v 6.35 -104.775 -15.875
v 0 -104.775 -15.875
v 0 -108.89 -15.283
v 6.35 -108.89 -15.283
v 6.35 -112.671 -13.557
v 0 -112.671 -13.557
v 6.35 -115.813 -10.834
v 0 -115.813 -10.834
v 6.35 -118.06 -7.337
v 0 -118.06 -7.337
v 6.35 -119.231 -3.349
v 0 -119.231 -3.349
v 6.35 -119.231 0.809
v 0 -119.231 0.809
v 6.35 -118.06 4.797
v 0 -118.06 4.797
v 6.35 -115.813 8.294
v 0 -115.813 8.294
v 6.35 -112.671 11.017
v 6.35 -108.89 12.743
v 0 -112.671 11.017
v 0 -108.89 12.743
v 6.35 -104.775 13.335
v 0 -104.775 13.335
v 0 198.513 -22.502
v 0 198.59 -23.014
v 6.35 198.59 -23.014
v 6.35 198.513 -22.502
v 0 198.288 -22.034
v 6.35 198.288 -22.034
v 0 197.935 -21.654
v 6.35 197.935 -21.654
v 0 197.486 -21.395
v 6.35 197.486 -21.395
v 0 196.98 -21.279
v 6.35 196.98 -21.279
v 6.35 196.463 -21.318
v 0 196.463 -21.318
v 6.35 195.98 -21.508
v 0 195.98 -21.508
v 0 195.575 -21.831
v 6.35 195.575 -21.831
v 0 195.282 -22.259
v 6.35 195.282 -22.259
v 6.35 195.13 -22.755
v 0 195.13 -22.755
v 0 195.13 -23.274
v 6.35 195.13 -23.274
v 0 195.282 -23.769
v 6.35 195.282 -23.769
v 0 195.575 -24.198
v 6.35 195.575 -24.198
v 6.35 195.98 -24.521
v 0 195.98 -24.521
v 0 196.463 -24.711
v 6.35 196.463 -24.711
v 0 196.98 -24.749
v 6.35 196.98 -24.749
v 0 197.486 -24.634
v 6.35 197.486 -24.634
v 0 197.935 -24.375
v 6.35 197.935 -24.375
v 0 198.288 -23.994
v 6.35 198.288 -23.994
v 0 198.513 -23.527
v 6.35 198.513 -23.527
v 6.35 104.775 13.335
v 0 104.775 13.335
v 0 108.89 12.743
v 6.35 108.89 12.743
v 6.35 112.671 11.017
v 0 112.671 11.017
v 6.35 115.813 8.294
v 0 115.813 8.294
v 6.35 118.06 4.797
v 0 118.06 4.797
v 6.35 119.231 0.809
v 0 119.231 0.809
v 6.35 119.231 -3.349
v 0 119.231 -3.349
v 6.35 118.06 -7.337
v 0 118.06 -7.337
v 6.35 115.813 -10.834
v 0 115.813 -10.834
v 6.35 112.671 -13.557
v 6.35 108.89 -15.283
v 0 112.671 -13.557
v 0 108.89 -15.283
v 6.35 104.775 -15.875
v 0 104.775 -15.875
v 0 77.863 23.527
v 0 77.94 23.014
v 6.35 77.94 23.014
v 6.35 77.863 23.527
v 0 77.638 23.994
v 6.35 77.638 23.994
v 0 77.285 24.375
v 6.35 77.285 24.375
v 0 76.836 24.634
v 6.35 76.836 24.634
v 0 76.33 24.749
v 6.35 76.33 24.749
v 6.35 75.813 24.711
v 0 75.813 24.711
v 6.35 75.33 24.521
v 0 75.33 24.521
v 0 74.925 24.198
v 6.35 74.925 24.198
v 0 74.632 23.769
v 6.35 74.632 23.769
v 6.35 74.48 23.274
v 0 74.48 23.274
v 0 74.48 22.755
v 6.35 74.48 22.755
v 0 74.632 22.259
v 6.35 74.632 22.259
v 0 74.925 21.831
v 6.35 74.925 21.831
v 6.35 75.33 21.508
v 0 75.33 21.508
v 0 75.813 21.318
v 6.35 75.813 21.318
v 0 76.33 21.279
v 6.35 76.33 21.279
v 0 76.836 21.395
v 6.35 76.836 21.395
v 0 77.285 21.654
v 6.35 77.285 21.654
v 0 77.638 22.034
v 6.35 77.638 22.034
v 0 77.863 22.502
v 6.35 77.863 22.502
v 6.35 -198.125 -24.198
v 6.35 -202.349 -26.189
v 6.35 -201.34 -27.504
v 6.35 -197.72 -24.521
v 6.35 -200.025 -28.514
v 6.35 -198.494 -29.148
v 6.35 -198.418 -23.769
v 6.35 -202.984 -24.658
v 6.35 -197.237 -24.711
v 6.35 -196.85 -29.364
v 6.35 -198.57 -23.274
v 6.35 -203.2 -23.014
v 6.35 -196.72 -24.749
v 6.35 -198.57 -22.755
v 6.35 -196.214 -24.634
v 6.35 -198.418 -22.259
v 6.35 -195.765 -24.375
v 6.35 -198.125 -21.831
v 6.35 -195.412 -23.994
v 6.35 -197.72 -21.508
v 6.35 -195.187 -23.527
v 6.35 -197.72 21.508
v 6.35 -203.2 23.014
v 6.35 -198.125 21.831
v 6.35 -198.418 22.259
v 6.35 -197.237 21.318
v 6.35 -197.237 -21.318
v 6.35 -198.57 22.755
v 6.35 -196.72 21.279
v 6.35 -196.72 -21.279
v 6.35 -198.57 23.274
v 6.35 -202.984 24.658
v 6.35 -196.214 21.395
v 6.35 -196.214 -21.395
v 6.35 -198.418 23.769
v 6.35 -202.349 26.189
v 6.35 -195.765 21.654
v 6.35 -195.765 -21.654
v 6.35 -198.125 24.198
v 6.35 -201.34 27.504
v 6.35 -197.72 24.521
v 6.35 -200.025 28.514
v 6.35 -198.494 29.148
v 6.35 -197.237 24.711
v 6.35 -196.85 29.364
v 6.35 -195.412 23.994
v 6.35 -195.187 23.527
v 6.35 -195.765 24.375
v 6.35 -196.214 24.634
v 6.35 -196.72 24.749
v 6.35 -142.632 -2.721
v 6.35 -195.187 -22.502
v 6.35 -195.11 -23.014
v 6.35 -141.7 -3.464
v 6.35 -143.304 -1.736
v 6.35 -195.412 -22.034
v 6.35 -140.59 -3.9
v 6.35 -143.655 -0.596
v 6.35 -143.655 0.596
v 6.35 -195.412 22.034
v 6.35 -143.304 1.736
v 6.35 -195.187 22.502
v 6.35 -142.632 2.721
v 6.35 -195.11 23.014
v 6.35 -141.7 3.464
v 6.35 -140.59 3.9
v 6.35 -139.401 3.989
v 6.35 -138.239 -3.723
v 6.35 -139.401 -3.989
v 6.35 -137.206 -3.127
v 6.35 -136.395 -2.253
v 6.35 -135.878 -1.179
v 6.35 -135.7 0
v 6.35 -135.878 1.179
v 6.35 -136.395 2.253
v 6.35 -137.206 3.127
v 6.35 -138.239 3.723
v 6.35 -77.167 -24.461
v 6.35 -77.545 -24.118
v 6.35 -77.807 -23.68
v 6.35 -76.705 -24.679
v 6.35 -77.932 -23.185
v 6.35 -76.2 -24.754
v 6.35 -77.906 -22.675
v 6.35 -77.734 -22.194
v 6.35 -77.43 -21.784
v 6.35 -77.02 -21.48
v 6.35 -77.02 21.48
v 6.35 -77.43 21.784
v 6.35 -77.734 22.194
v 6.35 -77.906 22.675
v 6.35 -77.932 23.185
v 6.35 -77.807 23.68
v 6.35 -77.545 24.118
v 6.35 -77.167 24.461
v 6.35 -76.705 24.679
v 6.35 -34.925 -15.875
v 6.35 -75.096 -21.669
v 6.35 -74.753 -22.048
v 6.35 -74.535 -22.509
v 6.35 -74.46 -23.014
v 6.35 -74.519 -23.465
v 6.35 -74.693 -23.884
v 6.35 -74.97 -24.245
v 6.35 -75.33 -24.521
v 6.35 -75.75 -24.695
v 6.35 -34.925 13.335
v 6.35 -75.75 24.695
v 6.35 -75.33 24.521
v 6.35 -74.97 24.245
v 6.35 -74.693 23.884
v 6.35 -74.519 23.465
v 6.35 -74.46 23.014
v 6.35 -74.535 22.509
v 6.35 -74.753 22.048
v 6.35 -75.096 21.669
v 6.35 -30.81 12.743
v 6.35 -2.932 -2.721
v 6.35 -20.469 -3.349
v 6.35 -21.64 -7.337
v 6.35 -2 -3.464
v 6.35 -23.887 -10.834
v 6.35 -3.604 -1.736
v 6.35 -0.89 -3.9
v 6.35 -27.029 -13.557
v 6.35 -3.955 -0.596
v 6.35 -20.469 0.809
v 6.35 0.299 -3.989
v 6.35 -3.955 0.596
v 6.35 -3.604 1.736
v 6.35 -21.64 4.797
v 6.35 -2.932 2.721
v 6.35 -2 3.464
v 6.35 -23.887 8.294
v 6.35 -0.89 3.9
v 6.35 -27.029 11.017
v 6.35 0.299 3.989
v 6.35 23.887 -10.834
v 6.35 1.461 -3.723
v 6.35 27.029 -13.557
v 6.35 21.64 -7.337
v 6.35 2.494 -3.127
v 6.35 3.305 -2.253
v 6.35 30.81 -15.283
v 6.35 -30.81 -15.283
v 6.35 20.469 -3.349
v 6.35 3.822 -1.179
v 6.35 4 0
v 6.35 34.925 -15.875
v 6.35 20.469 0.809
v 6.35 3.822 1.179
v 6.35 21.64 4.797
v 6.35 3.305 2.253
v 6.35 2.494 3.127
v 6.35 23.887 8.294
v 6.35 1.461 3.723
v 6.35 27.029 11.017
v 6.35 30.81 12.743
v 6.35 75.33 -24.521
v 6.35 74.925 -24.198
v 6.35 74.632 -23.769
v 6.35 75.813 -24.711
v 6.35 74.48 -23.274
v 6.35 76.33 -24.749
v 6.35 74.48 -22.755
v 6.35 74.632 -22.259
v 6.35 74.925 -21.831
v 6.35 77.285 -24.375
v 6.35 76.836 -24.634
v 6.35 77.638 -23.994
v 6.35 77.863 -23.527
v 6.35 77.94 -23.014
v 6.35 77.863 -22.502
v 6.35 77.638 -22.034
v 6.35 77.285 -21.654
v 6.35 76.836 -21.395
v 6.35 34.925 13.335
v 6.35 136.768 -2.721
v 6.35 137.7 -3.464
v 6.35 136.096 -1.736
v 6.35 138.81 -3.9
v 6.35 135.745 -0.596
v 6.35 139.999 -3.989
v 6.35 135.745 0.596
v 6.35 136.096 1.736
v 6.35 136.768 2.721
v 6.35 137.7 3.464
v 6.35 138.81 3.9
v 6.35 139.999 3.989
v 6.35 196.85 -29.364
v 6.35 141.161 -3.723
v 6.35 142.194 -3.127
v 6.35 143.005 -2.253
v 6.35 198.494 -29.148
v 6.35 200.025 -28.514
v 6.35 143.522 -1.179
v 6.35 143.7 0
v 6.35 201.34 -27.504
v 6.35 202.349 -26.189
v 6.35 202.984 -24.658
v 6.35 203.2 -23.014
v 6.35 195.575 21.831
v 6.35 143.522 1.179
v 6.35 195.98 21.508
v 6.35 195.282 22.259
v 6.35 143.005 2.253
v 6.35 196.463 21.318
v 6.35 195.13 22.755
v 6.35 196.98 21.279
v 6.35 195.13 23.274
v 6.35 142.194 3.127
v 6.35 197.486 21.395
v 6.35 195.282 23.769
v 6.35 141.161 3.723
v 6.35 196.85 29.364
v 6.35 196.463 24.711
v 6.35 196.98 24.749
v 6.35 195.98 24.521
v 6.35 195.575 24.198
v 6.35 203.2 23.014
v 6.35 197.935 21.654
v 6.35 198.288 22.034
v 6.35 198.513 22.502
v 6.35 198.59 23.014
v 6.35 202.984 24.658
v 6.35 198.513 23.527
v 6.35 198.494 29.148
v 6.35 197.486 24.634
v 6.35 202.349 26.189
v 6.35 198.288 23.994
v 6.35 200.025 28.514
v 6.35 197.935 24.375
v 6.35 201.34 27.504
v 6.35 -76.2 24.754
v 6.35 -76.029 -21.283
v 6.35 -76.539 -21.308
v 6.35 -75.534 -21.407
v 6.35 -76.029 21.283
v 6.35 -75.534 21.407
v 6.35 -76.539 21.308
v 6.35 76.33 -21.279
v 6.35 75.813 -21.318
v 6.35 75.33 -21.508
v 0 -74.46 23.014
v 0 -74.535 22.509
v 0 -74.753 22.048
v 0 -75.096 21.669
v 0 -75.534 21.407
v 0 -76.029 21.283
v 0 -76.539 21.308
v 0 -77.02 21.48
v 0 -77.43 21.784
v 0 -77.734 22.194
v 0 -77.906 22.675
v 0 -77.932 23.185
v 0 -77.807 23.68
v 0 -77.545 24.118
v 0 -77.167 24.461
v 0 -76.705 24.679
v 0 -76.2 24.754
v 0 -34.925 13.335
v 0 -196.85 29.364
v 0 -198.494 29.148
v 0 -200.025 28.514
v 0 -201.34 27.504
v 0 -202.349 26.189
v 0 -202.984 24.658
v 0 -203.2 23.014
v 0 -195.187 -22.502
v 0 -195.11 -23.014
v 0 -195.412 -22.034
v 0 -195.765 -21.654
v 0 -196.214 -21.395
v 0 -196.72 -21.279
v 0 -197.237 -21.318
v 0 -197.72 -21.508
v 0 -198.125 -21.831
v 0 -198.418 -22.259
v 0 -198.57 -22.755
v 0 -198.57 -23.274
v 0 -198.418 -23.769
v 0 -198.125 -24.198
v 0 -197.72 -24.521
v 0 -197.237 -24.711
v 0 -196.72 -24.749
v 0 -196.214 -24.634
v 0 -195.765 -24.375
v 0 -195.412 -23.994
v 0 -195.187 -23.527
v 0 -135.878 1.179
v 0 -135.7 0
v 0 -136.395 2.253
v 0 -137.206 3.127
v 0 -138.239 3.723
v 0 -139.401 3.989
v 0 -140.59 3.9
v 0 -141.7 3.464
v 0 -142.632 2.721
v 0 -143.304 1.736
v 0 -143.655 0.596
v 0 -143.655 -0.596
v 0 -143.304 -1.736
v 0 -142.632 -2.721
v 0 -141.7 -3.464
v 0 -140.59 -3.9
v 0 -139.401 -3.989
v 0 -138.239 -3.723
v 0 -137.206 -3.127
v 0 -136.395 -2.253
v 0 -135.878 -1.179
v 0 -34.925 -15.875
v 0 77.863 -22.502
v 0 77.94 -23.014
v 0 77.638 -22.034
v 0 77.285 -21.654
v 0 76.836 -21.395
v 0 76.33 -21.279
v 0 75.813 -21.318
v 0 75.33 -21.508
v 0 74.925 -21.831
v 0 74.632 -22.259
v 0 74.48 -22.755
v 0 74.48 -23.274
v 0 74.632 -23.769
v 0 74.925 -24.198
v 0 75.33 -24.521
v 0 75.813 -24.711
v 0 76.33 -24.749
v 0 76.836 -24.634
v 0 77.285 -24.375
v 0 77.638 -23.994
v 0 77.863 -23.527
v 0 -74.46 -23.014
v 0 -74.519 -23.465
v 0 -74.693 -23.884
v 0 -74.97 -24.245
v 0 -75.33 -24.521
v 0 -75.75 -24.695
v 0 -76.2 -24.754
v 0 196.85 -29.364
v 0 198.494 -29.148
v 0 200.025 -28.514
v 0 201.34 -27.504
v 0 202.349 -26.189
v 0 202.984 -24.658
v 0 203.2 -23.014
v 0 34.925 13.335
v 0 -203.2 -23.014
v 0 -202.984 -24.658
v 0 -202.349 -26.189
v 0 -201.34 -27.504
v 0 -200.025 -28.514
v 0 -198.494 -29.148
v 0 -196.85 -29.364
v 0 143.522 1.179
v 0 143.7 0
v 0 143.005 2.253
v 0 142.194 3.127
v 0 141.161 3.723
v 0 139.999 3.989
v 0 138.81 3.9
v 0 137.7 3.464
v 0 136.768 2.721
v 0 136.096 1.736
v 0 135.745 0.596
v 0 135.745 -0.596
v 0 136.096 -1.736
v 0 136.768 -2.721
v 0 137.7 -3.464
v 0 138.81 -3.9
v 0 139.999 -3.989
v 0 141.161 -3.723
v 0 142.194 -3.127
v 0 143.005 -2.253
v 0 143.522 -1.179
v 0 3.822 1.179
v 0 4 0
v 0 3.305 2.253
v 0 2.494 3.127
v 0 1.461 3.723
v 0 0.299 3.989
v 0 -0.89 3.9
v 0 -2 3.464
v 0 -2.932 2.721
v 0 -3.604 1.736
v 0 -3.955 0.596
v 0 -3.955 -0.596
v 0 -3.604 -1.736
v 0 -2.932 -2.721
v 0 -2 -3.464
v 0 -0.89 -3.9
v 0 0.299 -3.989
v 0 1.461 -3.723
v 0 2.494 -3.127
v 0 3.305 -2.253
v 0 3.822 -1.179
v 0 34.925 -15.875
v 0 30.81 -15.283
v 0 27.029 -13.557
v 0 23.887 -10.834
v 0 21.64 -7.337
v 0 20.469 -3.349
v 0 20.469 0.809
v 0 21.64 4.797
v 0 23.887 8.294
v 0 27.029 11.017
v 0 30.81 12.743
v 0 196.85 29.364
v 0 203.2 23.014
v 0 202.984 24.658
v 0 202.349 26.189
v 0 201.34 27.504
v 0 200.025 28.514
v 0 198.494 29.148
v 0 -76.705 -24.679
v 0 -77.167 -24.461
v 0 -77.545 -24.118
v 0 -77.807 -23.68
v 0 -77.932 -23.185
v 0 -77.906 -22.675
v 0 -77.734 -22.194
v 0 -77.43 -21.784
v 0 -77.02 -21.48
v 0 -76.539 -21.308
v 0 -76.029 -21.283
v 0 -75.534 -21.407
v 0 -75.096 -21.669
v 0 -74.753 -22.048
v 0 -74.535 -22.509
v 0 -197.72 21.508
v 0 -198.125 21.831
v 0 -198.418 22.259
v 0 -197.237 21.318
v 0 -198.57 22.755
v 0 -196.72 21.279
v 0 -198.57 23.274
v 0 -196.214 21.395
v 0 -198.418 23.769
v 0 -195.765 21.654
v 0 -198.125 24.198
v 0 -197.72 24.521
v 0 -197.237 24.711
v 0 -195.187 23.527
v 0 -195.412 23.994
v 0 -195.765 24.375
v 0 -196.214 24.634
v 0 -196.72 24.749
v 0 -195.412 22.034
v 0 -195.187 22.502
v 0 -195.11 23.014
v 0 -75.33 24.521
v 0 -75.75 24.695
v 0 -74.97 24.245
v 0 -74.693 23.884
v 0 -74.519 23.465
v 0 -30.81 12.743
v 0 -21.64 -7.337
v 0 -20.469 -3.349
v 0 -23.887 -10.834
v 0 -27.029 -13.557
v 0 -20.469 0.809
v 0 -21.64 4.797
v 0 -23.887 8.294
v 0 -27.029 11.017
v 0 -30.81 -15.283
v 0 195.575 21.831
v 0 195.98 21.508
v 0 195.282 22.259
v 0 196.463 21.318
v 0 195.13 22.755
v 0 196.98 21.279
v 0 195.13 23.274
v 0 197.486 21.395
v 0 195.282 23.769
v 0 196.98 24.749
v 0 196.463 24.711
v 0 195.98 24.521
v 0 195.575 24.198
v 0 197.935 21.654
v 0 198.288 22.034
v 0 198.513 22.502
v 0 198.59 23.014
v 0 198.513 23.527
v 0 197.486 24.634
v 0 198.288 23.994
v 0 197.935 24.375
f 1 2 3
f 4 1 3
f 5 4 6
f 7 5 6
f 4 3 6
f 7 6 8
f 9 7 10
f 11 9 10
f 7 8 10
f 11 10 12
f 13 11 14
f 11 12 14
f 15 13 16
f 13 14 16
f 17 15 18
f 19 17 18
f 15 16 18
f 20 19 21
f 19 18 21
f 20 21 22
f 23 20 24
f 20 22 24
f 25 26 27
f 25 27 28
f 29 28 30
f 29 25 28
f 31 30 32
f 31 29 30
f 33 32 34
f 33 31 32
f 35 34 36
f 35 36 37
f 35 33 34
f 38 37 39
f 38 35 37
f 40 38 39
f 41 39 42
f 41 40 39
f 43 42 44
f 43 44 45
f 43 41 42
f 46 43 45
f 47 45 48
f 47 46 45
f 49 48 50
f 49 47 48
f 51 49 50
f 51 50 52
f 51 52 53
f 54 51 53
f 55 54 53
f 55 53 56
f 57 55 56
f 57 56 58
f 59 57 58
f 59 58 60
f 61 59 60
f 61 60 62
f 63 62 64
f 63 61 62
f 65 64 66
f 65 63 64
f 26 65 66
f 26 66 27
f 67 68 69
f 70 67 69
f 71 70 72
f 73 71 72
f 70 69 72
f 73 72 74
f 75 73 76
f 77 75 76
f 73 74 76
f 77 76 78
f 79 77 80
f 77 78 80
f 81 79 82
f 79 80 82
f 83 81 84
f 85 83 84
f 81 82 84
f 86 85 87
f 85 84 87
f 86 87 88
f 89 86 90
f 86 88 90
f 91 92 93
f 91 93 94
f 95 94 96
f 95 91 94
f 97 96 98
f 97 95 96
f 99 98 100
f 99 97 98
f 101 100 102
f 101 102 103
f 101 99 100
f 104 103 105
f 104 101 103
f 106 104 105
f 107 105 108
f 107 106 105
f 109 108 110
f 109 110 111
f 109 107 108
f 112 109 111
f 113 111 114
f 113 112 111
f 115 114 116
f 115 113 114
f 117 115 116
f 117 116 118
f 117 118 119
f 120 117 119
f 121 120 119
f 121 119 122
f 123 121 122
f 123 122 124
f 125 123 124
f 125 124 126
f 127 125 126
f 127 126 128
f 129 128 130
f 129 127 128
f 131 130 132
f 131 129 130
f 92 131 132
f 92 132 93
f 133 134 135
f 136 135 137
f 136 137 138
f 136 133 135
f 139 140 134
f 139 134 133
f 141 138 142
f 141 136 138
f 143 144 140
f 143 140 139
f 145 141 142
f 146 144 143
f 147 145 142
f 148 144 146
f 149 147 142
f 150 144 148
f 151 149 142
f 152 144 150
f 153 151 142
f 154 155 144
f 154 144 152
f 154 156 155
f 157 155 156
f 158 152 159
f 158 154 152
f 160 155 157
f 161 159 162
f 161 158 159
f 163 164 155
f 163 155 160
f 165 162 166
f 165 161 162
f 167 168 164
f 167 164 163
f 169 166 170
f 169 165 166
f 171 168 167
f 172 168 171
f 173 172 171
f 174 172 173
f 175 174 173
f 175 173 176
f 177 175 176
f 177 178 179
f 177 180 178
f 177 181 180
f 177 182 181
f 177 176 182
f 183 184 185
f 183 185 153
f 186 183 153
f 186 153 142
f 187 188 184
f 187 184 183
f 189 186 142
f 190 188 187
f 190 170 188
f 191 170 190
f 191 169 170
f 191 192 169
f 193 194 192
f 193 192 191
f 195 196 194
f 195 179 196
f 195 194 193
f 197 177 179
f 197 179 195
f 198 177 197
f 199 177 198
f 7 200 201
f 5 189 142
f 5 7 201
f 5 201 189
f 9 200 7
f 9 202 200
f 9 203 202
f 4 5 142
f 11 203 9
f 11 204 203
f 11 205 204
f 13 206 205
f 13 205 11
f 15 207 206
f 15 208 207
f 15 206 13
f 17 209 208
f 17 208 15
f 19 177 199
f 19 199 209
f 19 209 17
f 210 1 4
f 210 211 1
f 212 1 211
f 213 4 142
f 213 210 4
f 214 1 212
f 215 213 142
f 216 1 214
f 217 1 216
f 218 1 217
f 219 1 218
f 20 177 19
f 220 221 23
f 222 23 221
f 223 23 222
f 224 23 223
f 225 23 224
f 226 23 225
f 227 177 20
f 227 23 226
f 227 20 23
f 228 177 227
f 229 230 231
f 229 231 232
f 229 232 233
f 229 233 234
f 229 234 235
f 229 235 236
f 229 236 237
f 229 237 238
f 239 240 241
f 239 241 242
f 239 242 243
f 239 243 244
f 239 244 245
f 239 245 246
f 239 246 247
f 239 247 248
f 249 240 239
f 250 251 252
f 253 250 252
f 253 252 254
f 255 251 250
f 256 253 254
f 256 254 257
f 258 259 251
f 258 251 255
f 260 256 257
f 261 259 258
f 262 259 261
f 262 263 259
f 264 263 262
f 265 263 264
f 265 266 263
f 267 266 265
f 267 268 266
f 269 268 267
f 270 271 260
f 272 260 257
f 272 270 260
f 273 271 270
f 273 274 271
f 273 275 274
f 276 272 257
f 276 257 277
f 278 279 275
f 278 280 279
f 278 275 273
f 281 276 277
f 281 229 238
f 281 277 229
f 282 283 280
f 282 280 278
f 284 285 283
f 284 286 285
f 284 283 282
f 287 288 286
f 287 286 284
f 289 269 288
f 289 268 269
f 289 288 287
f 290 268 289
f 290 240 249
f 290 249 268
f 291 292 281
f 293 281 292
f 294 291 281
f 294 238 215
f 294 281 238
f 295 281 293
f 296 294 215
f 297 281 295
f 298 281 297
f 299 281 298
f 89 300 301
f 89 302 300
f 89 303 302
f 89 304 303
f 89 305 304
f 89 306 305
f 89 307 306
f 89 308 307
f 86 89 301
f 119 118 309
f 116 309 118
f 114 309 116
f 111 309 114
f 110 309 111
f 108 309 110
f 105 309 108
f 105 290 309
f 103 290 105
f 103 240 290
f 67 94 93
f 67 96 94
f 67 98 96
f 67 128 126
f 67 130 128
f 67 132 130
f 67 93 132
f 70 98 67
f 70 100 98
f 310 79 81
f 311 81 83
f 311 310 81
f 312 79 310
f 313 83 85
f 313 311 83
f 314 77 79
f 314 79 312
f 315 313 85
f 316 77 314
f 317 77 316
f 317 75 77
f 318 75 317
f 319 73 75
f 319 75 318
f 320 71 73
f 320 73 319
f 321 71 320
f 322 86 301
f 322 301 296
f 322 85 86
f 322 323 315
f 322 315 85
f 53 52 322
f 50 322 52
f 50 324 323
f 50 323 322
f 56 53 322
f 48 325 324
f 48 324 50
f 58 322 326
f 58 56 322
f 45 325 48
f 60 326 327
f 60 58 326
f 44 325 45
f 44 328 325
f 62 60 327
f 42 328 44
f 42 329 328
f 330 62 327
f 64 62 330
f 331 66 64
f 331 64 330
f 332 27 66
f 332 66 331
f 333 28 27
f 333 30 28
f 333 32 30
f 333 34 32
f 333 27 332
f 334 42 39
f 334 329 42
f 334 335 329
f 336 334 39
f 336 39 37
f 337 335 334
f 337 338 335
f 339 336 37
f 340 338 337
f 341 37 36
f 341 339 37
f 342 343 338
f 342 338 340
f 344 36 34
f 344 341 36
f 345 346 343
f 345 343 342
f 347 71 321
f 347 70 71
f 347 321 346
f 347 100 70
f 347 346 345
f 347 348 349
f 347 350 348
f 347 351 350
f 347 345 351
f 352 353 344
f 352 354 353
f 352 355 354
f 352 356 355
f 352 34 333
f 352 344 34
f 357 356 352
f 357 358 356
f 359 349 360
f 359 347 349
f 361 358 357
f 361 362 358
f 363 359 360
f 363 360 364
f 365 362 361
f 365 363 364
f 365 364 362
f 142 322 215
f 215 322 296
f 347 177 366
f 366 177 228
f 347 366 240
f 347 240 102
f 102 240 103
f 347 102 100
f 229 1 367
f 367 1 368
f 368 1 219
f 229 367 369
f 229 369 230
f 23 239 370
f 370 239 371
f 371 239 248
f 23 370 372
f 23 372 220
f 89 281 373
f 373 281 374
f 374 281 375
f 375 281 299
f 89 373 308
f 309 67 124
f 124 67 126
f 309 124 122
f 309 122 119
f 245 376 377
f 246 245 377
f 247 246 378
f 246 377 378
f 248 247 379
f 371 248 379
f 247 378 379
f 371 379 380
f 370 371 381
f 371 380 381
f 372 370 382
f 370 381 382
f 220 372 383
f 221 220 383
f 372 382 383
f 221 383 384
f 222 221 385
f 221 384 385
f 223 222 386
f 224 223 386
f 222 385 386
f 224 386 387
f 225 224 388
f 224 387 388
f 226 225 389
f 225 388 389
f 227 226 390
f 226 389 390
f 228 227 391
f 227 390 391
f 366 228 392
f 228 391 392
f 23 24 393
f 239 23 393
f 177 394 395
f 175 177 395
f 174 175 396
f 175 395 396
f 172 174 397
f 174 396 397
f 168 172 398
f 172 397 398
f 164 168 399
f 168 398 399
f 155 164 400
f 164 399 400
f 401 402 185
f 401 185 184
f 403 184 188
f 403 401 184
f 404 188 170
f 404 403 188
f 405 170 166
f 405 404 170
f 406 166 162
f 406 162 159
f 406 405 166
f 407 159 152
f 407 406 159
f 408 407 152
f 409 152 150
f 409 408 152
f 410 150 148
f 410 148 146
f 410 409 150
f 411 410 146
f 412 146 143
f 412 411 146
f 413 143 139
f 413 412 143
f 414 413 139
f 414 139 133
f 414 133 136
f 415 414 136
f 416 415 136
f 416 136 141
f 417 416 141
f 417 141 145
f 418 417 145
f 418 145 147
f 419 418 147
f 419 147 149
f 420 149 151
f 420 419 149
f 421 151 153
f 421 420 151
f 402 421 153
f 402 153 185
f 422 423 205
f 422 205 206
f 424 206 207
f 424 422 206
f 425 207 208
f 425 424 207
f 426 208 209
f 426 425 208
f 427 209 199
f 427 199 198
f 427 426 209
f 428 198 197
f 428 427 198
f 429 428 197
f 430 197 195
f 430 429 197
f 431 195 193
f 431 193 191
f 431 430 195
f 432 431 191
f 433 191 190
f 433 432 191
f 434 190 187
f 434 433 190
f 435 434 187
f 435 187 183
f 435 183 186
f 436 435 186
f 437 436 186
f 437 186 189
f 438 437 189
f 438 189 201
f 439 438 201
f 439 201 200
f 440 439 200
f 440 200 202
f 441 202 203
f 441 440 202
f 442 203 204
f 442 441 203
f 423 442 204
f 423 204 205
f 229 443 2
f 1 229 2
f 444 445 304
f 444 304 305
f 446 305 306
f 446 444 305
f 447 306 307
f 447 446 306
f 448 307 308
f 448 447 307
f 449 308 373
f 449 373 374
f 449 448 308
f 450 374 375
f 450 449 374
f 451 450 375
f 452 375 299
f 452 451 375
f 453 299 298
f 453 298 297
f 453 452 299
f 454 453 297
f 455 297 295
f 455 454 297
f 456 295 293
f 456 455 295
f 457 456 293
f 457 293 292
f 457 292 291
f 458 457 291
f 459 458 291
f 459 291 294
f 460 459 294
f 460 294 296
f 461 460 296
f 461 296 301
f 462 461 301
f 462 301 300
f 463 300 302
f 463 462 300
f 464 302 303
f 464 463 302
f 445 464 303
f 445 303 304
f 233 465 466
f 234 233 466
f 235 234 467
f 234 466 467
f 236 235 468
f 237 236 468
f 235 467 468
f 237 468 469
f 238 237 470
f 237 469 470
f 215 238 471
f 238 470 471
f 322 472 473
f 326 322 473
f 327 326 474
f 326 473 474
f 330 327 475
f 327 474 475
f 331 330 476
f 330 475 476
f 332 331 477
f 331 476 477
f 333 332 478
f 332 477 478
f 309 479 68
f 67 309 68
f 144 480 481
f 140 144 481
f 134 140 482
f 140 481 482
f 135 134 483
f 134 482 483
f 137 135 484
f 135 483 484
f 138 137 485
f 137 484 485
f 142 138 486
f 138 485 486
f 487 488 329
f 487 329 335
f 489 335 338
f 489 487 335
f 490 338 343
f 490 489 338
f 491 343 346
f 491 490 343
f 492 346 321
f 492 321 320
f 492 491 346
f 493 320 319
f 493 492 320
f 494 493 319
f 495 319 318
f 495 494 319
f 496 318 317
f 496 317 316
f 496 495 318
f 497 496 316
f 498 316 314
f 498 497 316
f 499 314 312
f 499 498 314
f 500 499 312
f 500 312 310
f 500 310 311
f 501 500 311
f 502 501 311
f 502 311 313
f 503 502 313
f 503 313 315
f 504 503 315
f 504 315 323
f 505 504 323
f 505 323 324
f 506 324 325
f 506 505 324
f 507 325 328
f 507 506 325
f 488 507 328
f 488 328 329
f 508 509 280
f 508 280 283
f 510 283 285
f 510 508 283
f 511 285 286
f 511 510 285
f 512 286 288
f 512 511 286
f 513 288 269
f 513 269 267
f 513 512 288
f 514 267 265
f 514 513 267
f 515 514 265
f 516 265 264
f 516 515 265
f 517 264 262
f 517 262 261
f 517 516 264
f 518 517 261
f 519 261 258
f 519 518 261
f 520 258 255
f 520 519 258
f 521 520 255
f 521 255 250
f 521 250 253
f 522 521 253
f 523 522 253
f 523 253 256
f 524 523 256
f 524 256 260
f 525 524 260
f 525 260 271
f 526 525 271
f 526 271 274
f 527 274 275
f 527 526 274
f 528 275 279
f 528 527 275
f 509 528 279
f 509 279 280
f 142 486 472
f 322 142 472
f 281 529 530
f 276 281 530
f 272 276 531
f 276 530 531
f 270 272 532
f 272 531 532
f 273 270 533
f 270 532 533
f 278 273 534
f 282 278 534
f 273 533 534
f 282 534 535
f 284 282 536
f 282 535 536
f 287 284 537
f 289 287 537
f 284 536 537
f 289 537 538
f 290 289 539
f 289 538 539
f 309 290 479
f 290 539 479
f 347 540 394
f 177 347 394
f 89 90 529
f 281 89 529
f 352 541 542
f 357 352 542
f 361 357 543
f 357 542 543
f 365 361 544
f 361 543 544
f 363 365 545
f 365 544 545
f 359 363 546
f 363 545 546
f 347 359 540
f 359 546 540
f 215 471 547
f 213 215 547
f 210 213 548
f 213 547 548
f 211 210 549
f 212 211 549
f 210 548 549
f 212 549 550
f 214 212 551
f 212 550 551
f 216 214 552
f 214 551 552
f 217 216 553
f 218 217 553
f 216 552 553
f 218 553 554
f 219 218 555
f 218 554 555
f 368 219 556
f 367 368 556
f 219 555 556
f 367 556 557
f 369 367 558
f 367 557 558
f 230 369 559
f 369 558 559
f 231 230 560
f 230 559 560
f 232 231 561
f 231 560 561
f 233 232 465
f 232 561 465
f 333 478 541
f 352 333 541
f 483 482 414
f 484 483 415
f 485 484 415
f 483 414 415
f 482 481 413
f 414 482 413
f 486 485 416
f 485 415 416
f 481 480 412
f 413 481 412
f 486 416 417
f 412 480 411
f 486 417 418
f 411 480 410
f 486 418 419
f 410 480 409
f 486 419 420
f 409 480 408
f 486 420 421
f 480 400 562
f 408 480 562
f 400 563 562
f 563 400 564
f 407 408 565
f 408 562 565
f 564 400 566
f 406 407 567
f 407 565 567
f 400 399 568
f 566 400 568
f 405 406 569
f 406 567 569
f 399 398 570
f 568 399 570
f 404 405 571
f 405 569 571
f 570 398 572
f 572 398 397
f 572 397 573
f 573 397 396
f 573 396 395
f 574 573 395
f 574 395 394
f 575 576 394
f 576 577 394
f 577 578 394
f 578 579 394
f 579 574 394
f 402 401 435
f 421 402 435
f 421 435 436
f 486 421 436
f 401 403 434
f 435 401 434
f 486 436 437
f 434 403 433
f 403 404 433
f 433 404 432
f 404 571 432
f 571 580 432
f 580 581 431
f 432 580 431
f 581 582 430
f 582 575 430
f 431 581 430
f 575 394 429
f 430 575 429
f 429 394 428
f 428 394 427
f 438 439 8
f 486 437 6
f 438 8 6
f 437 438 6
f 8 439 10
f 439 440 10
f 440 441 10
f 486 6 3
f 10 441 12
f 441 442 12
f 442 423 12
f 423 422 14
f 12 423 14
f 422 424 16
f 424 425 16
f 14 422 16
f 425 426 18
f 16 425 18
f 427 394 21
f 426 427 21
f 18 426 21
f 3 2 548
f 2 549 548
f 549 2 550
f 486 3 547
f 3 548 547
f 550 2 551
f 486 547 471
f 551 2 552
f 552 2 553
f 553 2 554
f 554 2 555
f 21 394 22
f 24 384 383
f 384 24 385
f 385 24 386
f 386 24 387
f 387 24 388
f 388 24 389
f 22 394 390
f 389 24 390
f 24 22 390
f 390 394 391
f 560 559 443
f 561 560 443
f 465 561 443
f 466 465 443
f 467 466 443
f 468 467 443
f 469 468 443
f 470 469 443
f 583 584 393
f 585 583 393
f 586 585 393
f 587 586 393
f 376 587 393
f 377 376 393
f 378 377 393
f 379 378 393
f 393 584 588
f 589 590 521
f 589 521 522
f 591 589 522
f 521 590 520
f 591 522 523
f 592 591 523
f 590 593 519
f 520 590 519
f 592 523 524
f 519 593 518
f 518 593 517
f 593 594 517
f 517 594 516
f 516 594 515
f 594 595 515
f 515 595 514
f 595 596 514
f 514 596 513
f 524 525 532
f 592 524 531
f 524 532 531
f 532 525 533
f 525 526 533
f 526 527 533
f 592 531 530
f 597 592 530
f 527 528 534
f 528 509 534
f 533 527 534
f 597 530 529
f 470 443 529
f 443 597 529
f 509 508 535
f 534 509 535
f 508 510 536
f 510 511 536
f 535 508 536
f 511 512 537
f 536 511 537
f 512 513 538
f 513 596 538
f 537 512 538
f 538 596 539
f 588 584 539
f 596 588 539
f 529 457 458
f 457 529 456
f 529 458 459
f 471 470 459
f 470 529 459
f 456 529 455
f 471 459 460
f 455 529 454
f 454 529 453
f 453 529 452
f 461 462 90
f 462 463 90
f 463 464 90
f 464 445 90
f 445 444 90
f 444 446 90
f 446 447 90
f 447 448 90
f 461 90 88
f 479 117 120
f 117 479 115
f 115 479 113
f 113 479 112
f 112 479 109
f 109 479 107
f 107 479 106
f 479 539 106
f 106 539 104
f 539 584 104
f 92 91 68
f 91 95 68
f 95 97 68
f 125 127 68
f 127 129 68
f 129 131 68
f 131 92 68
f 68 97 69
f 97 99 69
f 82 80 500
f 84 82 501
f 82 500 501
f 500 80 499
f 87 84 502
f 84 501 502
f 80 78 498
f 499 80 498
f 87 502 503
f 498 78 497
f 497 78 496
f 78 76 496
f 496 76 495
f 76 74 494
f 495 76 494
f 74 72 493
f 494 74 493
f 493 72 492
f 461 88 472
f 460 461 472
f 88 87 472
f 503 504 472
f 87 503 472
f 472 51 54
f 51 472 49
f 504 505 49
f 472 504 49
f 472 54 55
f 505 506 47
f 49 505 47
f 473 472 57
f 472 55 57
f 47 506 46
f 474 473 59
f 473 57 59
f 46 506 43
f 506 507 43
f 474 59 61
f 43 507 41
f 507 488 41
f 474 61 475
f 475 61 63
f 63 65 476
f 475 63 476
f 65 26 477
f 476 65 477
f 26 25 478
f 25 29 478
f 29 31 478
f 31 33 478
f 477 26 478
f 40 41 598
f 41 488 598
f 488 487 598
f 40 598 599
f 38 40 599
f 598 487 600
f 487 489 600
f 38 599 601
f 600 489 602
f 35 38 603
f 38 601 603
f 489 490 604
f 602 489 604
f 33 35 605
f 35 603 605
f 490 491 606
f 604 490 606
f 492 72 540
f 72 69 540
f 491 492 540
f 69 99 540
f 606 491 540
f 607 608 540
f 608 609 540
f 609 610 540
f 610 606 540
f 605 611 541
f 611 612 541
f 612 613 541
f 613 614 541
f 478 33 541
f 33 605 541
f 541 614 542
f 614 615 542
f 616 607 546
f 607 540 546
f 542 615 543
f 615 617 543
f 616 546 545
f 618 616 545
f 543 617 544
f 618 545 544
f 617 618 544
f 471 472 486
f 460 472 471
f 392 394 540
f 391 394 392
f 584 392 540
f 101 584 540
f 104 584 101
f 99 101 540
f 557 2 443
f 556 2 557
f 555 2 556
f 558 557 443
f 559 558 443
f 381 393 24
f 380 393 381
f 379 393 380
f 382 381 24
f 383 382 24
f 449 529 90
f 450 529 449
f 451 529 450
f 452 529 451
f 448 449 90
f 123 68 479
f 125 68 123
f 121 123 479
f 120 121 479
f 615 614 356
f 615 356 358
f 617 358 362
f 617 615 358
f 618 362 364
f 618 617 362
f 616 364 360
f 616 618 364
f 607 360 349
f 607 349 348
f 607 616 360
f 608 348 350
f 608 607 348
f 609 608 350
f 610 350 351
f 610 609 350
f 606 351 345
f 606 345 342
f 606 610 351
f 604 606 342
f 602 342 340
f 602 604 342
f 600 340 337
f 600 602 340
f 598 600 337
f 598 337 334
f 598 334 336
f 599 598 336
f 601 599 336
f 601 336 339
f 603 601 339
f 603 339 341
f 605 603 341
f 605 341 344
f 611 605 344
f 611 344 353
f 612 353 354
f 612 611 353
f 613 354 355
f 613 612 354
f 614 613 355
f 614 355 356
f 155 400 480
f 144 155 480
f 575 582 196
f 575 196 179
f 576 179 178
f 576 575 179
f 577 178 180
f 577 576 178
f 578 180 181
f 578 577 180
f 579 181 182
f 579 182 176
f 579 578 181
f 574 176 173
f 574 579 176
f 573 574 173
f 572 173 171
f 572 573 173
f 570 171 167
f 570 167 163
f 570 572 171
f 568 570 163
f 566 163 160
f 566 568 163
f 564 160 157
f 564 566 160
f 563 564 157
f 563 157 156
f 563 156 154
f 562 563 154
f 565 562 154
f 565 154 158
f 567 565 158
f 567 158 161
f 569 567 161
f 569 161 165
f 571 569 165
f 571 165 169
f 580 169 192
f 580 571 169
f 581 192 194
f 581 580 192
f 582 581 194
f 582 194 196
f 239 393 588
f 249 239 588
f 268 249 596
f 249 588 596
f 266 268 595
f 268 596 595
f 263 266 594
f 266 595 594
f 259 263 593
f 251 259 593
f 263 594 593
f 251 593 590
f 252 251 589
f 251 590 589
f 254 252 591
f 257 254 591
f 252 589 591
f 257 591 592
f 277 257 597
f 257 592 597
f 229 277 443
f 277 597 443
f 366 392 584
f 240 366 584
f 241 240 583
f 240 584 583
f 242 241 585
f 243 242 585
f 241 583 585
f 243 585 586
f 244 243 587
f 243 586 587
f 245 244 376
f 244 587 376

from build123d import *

# Parameters (mm, degrees)
F0_R     = 1.7399
F0_R_2   = 4
F1_DEPTH = 6.35


with BuildPart() as f1:
    # F0 (on Right) → F1 (new body)
    with BuildSketch(Plane.YZ):
        with BuildLine():
            ThreePointArc((-203.2, -23.014367), (-201.340128, -27.504495), (-196.85, -29.364367))
            Line((-196.85, -29.364367), (-76.2, -29.364367))
            Line((-76.2, -29.364367), (196.85, -29.364367))
            ThreePointArc((196.85, -29.364367), (201.340128, -27.504495), (203.2, -23.014367))
            Line((203.2, -23.014367), (203.2, 23.014367))
            ThreePointArc((203.2, 23.014367), (201.340128, 27.504495), (196.85, 29.364367))
            Line((196.85, 29.364367), (-76.2, 29.364367))
            Line((-76.2, 29.364367), (-196.85, 29.364367))
            ThreePointArc((-196.85, 29.364367), (-201.340128, 27.504495), (-203.2, 23.014367))
            Line((-203.2, 23.014367), (-203.2, -23.014367))
        make_face()
        with Locations((-196.85, -23.014367)):
            Circle(F0_R, mode=Mode.SUBTRACT)
        with BuildLine():
            ThreePointArc((-74.4601, -23.014367), (-74.969705, -24.244662), (-76.2, -24.754267))
            ThreePointArc((-76.2, -24.754267), (-77.430295, -21.784071), (-74.4601, -23.014367))
        make_face(mode=Mode.SUBTRACT)
        with Locations((-139.7, 0)):
            Circle(F0_R_2, mode=Mode.SUBTRACT)
        with BuildLine():
            Line((-34.925, -15.875), (-104.775, -15.875))
            ThreePointArc((-104.775, -15.875), (-119.38, -1.27), (-104.775, 13.335))
            Line((-104.775, 13.335), (-34.925, 13.335))
            ThreePointArc((-34.925, 13.335), (-20.32, -1.27), (-34.925, -15.875))
        make_face(mode=Mode.SUBTRACT)
        Circle(F0_R_2, mode=Mode.SUBTRACT)
        with Locations((76.2, -23.014367)):
            Circle(F0_R, mode=Mode.SUBTRACT)
        with Locations((196.85, -23.014367)):
            Circle(F0_R, mode=Mode.SUBTRACT)
        with BuildLine():
            Line((104.775, -15.875), (34.925, -15.875))
            ThreePointArc((34.925, -15.875), (20.32, -1.27), (34.925, 13.335))
            Line((34.925, 13.335), (104.775, 13.335))
            ThreePointArc((104.775, 13.335), (119.38, -1.27), (104.775, -15.875))
        make_face(mode=Mode.SUBTRACT)
        with Locations((139.7, 0)):
            Circle(F0_R_2, mode=Mode.SUBTRACT)
        with Locations((-196.85, 23.014367)):
            Circle(F0_R, mode=Mode.SUBTRACT)
        with BuildLine():
            ThreePointArc((-74.4601, 23.014367), (-77.430295, 21.784071), (-76.2, 24.754267))
            ThreePointArc((-76.2, 24.754267), (-74.969705, 24.244662), (-74.4601, 23.014367))
        make_face(mode=Mode.SUBTRACT)
        with Locations((76.2, 23.014367)):
            Circle(F0_R, mode=Mode.SUBTRACT)
        with Locations((196.85, 23.014367)):
            Circle(F0_R, mode=Mode.SUBTRACT)
    extrude(amount=F1_DEPTH)


solid = f1.part
